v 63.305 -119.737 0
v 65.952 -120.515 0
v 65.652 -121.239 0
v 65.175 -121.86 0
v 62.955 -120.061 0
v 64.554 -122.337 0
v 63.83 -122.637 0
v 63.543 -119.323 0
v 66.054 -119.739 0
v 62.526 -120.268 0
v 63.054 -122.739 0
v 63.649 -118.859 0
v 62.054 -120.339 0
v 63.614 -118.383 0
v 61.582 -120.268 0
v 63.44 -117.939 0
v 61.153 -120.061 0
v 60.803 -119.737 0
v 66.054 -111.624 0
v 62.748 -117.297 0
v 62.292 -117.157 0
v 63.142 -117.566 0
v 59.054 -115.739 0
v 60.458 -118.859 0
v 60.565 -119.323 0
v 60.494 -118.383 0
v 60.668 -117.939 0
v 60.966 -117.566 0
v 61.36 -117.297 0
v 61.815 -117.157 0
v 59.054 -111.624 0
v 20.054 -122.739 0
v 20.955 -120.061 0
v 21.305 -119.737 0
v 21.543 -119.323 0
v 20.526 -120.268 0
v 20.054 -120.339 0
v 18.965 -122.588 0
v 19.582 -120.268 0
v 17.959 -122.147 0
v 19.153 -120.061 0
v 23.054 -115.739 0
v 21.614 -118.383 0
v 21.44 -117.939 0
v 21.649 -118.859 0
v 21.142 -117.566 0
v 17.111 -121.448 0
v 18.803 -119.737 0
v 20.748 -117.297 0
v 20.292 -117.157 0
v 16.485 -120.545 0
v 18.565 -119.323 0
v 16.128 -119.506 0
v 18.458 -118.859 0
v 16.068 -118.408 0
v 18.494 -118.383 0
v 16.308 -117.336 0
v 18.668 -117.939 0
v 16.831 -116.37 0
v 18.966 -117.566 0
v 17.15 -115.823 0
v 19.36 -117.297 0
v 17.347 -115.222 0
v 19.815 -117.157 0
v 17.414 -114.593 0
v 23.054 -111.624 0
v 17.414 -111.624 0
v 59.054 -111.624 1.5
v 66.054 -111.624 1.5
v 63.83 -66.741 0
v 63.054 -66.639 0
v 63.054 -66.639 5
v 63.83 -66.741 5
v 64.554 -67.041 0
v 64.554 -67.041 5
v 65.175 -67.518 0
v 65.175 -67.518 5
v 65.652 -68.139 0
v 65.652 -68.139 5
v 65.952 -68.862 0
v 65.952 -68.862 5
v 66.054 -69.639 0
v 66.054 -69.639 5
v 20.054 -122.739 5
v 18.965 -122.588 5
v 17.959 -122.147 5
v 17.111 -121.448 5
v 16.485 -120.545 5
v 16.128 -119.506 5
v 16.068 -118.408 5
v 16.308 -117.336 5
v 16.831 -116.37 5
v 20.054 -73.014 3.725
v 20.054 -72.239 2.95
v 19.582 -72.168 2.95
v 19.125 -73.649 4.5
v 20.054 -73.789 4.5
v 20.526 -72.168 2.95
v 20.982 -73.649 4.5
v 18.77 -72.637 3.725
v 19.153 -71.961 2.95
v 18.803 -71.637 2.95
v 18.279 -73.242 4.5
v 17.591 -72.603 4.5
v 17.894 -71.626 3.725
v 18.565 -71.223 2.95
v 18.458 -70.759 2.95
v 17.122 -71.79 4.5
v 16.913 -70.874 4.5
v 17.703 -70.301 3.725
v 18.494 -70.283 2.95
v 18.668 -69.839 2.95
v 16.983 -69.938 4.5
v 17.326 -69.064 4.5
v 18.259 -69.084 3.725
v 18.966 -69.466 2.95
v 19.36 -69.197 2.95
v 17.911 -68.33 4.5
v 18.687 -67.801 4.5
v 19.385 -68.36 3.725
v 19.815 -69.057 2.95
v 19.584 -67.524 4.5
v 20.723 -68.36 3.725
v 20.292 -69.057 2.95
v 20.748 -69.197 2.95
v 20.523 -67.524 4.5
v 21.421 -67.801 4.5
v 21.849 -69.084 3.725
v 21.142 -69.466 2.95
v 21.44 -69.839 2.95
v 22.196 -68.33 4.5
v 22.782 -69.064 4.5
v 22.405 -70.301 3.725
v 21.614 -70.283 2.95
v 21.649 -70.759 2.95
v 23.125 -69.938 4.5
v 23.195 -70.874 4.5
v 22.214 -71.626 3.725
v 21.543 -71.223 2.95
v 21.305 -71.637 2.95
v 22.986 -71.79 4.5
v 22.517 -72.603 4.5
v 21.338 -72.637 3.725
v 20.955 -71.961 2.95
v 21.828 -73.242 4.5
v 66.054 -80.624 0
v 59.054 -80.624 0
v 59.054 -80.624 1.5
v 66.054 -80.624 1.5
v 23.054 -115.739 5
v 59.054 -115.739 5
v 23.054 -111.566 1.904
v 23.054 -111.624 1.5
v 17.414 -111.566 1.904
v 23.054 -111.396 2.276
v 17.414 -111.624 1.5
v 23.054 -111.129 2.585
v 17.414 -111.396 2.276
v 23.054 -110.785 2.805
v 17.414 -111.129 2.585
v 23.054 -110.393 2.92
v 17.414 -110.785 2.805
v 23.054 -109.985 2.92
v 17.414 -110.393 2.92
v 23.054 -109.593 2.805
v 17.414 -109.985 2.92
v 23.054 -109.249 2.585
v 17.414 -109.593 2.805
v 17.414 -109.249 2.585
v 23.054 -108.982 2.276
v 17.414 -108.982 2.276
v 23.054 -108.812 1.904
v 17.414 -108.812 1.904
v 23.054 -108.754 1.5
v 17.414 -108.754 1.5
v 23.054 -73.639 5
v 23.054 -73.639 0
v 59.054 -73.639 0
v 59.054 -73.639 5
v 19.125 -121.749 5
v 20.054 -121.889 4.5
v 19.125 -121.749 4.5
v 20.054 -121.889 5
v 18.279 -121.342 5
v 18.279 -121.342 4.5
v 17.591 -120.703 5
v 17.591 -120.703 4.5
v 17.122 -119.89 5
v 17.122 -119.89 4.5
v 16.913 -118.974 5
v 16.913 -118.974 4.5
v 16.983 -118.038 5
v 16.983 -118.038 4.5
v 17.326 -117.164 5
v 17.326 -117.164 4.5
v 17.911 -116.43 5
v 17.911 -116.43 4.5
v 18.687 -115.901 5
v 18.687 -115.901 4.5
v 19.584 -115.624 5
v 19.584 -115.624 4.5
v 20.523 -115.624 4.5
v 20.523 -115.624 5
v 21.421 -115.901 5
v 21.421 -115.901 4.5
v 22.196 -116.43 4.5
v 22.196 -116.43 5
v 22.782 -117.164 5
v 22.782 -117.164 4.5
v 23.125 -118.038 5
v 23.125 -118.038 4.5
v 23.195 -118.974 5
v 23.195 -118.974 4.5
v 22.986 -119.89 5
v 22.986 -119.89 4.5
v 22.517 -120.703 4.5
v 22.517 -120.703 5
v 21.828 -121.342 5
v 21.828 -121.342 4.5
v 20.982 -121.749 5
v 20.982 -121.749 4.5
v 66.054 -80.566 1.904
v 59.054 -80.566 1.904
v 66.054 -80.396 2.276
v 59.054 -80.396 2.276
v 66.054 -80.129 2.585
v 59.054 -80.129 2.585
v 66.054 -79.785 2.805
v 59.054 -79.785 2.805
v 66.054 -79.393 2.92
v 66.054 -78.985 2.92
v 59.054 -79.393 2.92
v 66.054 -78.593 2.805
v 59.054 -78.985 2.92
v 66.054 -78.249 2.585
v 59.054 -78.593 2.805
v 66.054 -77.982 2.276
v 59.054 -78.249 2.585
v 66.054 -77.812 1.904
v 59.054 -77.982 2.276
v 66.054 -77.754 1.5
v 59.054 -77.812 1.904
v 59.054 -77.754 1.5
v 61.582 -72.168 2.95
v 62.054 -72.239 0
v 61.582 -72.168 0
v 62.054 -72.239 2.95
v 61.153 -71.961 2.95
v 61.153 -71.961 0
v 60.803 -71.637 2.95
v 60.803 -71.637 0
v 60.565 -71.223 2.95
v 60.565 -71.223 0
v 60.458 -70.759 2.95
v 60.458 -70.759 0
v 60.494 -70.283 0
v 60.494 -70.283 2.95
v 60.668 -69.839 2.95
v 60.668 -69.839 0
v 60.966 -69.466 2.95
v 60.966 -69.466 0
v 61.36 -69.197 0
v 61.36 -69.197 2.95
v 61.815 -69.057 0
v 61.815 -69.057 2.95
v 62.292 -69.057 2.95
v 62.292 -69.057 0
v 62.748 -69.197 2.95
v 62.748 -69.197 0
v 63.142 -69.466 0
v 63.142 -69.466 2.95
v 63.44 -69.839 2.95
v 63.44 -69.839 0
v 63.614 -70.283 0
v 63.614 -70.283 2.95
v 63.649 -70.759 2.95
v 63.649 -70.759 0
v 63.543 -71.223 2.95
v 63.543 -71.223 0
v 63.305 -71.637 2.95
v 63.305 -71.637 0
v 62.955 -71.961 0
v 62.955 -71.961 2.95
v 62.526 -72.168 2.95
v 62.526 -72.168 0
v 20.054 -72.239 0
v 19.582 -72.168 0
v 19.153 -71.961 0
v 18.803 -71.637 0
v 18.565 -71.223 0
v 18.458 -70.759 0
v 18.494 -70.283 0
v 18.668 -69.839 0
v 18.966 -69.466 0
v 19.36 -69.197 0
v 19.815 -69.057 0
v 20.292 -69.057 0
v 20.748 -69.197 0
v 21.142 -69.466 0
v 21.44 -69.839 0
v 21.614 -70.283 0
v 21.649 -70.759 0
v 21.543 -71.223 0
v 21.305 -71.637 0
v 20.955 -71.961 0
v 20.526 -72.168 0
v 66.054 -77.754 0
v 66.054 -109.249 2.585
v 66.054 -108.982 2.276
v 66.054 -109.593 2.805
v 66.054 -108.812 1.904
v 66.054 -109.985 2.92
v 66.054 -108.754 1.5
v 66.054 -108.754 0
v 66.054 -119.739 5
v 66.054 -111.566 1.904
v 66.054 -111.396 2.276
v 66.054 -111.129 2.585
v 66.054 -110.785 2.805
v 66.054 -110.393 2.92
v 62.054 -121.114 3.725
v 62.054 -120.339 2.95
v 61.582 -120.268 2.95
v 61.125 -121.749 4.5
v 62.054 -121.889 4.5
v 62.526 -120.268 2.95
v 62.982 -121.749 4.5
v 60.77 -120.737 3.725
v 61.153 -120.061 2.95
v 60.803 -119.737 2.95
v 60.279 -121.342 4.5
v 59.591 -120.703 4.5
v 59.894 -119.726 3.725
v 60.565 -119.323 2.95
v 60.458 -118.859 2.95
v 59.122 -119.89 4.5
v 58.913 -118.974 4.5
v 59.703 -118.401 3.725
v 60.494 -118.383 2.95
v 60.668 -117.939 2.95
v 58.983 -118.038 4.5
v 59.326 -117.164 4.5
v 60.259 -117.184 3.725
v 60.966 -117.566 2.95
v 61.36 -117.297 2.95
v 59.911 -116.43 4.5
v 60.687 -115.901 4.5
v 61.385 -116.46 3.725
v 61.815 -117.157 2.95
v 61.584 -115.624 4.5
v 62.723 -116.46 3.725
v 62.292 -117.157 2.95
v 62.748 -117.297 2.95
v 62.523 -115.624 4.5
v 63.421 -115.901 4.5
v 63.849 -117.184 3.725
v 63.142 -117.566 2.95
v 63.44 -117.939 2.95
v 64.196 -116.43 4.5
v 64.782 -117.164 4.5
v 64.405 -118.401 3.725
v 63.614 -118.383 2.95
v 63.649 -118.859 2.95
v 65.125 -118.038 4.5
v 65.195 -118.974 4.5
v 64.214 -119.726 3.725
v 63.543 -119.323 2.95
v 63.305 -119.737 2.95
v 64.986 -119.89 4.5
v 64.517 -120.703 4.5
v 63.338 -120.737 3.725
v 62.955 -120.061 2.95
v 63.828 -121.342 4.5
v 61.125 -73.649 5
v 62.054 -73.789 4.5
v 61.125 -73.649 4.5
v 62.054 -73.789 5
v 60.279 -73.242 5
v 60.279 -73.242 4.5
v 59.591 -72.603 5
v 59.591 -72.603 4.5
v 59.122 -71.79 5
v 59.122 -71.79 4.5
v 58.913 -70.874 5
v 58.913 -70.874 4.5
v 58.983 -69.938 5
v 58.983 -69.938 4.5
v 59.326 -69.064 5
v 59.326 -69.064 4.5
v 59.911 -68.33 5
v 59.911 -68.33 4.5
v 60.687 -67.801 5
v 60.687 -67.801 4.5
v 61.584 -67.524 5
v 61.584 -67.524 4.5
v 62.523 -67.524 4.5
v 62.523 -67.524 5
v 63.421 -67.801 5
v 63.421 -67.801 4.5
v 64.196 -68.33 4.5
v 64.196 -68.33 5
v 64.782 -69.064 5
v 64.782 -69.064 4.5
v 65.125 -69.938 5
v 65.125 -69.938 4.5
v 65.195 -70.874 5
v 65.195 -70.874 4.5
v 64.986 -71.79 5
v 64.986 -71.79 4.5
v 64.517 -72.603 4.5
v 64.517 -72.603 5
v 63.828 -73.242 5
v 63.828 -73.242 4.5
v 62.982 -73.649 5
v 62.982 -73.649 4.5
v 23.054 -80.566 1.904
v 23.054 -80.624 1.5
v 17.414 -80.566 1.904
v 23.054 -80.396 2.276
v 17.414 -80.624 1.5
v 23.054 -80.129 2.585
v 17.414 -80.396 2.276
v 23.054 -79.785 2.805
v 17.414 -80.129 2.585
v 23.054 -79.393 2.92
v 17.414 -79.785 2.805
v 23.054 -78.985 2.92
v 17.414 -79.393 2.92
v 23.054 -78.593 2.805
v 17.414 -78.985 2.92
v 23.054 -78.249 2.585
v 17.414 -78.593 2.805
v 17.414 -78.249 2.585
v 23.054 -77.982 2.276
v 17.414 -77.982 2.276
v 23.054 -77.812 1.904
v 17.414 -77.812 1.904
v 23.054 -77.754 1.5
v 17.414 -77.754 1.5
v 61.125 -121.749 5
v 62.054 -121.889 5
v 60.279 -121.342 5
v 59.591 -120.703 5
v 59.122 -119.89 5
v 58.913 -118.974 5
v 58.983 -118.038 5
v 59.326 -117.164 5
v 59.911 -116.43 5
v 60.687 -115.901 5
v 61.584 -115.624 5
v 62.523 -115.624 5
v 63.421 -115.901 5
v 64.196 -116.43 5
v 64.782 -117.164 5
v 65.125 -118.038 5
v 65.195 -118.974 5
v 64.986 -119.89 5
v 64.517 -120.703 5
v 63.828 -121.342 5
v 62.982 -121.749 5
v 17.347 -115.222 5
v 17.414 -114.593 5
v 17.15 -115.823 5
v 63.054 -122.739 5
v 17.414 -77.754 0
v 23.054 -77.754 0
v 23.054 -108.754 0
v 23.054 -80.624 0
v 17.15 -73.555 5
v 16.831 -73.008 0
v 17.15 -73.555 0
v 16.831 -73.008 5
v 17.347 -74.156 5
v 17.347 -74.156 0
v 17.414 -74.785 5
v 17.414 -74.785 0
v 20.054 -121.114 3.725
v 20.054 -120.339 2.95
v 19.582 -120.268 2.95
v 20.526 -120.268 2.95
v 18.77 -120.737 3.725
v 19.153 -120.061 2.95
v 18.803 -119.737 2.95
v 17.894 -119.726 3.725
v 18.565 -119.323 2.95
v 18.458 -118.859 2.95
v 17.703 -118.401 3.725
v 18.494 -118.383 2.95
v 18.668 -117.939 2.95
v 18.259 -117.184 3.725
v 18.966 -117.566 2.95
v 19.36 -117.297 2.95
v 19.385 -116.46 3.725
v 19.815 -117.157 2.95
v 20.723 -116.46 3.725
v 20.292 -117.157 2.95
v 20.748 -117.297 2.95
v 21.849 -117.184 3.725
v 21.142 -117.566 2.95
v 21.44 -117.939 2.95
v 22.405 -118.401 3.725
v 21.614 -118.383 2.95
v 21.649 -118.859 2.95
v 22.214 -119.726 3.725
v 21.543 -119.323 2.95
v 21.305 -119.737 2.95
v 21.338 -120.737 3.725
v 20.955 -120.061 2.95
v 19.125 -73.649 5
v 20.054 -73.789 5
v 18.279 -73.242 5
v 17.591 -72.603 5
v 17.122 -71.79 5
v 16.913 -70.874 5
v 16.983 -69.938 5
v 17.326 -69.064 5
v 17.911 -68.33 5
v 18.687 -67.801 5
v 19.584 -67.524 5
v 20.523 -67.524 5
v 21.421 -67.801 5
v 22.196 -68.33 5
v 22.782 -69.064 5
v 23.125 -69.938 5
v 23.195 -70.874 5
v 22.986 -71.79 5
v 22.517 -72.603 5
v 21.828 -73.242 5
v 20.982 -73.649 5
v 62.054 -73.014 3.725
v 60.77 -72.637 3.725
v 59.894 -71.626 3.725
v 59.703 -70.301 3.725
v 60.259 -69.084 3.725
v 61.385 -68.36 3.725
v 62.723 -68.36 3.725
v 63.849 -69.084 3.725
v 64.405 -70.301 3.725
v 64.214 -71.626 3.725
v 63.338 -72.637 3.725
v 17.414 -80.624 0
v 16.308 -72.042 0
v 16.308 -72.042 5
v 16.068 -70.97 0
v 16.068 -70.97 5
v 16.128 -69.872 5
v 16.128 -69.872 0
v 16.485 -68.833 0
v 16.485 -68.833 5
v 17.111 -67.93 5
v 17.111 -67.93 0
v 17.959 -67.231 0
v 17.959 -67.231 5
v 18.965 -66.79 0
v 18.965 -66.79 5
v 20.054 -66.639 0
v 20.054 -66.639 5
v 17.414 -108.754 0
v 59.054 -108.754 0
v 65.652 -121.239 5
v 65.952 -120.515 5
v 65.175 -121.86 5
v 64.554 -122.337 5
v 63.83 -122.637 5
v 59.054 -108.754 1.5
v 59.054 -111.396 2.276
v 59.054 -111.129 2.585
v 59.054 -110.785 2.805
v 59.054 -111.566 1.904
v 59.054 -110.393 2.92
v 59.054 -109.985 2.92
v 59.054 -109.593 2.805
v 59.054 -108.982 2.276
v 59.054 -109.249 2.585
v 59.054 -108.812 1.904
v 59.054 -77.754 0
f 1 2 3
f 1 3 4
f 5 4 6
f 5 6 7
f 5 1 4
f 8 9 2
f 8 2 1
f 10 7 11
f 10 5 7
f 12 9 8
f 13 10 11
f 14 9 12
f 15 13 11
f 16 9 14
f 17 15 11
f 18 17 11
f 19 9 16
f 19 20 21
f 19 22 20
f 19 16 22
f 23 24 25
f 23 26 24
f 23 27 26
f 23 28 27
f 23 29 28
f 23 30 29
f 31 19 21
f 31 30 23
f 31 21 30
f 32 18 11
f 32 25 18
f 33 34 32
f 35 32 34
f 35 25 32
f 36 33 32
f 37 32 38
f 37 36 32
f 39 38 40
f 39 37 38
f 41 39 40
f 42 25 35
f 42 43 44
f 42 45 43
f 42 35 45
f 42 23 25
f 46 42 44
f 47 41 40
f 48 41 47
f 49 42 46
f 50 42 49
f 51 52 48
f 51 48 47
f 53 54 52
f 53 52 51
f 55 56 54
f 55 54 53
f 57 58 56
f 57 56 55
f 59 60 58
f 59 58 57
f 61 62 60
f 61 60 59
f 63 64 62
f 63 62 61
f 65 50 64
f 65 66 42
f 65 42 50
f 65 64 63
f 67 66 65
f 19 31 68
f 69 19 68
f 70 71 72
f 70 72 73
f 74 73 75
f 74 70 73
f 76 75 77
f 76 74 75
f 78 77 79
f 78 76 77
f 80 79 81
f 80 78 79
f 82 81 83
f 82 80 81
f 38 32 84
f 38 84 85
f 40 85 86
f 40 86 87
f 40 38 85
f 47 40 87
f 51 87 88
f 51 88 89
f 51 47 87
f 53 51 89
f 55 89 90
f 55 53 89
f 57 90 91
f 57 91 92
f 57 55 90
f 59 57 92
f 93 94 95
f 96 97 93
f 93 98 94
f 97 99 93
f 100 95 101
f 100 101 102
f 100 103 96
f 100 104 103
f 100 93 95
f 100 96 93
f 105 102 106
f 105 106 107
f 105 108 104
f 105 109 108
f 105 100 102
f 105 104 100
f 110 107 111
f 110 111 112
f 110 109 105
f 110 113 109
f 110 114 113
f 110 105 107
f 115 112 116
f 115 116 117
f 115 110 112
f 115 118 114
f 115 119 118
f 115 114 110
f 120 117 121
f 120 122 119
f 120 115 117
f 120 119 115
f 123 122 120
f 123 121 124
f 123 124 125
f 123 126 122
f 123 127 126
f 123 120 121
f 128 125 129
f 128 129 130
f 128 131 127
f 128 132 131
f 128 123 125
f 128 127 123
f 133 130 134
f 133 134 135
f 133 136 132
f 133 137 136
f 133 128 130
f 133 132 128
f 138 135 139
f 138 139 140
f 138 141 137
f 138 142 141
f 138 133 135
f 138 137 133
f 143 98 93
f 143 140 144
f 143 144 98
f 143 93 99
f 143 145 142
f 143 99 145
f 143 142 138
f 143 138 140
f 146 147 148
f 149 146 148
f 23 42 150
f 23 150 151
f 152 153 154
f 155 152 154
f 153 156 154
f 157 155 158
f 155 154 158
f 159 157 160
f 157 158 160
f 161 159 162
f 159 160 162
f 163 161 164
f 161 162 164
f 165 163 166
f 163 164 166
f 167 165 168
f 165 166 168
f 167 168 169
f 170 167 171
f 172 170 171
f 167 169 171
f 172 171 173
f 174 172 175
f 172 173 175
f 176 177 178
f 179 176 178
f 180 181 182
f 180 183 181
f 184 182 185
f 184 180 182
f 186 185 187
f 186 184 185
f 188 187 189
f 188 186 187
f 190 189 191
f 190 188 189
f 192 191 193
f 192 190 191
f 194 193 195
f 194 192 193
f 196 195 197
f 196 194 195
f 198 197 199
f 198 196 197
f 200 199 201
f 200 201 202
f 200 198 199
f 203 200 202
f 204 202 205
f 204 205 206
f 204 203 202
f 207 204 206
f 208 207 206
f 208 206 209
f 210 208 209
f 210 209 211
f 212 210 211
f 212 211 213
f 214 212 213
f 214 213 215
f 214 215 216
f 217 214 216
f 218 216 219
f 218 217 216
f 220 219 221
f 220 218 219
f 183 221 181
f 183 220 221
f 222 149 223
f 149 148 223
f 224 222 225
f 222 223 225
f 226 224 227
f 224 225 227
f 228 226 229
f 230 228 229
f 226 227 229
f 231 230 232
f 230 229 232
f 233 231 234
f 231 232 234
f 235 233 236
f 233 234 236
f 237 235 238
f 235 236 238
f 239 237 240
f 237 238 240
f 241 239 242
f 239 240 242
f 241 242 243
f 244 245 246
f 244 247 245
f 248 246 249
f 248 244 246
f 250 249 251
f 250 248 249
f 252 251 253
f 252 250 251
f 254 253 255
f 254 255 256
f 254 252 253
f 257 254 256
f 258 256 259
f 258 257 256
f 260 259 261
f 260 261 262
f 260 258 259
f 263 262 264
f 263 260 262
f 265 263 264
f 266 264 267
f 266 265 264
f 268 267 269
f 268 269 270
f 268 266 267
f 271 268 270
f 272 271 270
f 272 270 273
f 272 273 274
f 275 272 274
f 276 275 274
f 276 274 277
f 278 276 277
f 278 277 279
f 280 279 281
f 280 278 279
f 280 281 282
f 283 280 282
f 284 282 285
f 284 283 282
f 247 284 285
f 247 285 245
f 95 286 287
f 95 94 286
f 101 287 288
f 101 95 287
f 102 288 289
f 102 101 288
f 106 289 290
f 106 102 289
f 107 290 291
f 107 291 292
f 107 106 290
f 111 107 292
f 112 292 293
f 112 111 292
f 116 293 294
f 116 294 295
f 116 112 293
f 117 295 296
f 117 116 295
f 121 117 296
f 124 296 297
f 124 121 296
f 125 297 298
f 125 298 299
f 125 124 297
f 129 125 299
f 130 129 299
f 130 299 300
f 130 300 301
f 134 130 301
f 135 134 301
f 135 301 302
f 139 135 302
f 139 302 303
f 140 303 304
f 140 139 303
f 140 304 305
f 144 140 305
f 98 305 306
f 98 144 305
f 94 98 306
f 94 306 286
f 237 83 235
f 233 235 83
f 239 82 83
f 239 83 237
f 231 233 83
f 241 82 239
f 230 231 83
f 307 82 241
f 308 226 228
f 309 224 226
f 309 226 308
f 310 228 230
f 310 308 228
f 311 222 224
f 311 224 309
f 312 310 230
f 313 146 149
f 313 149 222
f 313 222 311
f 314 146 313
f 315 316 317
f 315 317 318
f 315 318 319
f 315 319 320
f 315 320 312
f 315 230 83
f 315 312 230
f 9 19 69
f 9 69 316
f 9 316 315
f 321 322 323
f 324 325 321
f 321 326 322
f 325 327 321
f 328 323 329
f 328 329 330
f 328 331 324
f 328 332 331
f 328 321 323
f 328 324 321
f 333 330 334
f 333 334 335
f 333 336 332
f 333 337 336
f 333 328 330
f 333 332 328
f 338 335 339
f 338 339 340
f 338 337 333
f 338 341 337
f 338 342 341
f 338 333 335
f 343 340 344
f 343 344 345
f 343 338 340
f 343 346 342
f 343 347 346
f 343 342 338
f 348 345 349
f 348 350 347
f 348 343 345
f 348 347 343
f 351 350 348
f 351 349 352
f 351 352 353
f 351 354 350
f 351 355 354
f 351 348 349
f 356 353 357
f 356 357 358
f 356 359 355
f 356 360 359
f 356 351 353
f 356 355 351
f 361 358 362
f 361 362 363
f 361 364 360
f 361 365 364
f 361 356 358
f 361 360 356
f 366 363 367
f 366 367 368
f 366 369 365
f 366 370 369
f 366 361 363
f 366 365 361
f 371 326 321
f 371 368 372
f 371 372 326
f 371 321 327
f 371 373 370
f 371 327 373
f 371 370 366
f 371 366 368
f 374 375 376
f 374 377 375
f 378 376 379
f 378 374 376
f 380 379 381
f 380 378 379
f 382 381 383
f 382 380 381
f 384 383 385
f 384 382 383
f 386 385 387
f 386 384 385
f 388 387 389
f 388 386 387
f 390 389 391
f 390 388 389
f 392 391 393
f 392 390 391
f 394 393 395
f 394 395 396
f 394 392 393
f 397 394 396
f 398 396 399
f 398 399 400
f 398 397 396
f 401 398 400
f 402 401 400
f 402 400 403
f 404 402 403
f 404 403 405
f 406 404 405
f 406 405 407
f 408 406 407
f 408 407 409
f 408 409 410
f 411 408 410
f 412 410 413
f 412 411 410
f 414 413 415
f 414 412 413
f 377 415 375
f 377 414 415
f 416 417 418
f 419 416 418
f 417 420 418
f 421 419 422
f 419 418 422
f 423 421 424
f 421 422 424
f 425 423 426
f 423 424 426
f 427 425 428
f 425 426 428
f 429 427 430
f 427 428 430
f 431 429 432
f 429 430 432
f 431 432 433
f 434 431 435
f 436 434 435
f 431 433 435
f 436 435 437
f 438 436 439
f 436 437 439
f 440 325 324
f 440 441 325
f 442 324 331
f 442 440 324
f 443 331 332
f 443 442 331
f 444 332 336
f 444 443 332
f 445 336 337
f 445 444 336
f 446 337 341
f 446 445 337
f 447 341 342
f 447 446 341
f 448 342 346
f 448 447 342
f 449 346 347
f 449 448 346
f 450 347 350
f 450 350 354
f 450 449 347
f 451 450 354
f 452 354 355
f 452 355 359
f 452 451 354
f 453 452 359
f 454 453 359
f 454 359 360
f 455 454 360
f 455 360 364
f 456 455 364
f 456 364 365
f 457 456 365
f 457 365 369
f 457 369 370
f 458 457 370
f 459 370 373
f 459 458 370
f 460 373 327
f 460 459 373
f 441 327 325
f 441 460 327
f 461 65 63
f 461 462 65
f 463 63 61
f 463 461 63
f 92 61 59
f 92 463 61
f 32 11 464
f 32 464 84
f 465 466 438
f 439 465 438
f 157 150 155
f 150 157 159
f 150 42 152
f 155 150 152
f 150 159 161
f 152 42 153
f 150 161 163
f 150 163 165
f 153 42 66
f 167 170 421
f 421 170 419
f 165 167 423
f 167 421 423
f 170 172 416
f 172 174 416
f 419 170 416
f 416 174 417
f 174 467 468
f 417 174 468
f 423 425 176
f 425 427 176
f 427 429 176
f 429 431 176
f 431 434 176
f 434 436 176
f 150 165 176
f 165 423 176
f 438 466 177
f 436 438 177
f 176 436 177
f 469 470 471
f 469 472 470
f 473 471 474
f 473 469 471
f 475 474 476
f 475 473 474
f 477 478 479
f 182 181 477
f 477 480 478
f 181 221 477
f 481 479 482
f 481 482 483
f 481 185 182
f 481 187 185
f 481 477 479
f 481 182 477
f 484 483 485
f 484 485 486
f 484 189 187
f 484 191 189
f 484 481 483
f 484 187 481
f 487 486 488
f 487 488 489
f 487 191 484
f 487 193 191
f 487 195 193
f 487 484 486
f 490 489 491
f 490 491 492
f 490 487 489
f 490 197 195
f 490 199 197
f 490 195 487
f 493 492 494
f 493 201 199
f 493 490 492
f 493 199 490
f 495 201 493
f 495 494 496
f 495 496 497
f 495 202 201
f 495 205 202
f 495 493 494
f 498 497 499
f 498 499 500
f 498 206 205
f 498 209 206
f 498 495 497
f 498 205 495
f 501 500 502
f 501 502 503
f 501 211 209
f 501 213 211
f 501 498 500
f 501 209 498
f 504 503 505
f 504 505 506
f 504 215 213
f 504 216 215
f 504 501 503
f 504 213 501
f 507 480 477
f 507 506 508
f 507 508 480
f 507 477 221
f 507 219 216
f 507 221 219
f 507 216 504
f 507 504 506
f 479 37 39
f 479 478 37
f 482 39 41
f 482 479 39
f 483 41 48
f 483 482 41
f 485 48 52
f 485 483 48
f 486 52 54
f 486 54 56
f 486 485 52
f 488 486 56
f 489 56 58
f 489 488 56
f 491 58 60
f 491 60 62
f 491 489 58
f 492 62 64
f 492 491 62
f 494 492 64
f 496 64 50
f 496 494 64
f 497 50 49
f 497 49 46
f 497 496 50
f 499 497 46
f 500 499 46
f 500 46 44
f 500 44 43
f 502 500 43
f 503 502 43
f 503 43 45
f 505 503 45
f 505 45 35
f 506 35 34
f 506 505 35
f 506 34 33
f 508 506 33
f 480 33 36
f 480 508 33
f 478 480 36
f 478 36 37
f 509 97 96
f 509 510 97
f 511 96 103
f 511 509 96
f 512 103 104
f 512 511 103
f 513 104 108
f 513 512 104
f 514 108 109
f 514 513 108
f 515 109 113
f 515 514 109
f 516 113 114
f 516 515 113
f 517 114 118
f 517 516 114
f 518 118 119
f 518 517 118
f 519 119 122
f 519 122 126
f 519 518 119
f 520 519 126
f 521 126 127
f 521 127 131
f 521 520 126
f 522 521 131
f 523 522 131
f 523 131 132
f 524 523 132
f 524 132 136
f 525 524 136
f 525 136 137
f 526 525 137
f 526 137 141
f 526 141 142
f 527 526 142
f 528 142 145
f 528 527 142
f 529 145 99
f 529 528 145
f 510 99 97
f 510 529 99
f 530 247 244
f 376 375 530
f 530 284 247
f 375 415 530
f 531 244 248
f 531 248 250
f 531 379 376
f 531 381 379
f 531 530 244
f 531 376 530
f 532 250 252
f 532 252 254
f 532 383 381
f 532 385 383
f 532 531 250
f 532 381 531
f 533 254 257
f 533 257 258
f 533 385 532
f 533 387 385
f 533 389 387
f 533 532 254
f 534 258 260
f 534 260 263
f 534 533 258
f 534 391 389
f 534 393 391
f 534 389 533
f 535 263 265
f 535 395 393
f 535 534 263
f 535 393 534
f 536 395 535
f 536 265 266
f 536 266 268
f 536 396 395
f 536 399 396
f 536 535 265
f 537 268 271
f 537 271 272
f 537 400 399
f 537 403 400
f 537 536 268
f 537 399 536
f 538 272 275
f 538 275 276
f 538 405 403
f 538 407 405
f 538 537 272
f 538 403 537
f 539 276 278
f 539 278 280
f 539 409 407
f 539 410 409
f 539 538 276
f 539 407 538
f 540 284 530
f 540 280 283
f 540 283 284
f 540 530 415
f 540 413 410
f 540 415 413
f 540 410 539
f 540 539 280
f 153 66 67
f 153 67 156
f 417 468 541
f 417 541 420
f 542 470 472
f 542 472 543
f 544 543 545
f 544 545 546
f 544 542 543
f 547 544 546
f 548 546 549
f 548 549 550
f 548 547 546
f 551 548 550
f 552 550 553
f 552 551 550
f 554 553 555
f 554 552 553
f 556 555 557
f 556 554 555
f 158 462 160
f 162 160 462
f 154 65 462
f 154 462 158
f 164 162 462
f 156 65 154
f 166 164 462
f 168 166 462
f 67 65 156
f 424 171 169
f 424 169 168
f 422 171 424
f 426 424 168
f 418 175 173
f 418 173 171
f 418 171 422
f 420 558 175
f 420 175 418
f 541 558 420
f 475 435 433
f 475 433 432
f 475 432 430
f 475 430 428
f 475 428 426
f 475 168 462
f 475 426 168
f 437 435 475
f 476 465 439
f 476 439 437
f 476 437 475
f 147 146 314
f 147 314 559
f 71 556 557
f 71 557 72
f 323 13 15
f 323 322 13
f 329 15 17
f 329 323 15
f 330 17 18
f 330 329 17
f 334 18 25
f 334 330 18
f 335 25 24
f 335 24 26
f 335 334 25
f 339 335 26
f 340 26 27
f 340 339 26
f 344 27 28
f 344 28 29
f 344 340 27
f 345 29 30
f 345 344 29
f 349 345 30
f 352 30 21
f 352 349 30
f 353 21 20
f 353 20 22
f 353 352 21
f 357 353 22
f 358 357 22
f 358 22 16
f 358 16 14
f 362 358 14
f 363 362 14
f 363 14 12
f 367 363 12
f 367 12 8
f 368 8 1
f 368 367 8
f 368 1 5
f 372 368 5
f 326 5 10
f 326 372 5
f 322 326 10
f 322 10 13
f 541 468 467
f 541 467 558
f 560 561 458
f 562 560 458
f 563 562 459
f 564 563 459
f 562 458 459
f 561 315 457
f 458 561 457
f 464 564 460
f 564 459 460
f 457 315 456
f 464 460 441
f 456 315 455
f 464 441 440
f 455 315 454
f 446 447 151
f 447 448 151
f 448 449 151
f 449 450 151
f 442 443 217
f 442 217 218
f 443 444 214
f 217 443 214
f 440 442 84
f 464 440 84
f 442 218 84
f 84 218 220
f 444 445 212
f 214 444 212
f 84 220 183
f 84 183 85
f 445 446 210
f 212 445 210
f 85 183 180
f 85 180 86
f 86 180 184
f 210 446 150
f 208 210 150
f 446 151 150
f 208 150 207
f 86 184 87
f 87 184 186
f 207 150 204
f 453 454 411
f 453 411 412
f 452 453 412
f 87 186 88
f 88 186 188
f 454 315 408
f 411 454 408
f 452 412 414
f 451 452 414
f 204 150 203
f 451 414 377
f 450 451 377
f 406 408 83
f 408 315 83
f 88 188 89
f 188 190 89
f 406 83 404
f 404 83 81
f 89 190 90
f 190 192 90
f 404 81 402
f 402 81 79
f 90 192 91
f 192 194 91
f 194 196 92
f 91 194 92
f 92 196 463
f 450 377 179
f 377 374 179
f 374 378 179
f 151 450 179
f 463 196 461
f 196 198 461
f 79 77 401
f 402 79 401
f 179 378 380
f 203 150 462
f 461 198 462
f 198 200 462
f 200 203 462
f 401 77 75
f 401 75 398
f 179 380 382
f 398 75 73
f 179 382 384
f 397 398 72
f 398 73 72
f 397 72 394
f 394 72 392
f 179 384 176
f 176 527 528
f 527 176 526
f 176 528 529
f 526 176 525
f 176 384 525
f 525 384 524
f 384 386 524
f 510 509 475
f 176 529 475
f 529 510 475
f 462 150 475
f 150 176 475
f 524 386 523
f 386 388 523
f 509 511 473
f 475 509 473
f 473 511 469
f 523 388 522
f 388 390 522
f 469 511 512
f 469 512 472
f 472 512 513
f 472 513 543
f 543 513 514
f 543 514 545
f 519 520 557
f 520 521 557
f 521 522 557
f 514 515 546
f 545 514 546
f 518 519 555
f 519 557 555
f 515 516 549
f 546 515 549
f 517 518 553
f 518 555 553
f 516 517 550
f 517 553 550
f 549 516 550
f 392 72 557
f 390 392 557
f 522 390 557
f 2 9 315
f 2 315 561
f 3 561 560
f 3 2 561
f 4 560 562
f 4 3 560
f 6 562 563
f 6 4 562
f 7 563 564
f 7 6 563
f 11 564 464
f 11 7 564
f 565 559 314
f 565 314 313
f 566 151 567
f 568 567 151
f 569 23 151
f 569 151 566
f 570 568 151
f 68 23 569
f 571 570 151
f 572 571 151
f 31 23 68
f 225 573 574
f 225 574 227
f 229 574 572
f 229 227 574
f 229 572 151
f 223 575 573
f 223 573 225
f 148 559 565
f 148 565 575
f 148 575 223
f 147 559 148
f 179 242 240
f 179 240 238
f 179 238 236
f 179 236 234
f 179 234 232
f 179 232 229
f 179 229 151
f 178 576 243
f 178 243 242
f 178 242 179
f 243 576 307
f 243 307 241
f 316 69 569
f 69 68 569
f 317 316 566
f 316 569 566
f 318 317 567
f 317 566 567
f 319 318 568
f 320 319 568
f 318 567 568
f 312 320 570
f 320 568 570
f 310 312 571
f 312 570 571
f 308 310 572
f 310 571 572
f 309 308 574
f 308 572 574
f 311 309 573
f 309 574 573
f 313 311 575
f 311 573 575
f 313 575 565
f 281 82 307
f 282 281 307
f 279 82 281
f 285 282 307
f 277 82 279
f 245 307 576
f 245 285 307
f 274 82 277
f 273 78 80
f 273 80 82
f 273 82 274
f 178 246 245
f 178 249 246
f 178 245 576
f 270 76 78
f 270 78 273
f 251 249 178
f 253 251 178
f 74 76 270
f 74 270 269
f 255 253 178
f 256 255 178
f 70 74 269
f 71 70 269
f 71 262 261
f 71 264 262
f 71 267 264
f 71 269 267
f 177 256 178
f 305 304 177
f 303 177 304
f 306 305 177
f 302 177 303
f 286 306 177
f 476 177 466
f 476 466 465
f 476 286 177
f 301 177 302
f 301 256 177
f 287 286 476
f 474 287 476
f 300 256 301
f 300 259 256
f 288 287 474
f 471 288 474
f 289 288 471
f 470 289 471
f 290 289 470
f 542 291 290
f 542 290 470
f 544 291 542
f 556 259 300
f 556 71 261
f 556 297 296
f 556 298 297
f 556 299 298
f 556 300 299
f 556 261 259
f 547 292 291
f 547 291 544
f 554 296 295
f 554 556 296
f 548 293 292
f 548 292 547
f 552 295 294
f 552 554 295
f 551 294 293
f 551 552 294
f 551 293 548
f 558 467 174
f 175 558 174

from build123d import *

# Parameters (mm, degrees)
SKETCH1_R                                    = 1.25
SKETCH1_W                                    = 36
SKETCH1_H                                    = 42.1
BOSS_EXTRUDE1_DEPTH                          = 5
CSK_FOR_M3_COUNTERSUNK_FLAT_HEAD_SCR_2_COUNT = 2
CSK_FOR_M3_COUNTERSUNK_FLAT_HEAD_SCR_2_PITCH = 48.1
CSK_FOR_M3_COUNTERSUNK_FLAT_HEAD_SCR_3_COUNT = 2
CSK_FOR_M3_COUNTERSUNK_FLAT_HEAD_SCR_3_PITCH = 63.856166499
CSK_FOR_M3_COUNTERSUNK_FLAT_HEAD_SCR_4_COUNT = 2
CSK_FOR_M3_COUNTERSUNK_FLAT_HEAD_SCR_4_PITCH = 42
FURO_COM_FOLGA_DE_M34_D                      = 2.87
FILETE1_R                                    = 3
ESBO_O3_W                                    = 1.5
ESBO_O3_H                                    = 2.87
CORTE_EXTRUS_O1_DEPTH                        = 63
CORTE_EXTRUS_O1_DEPTH_BACK                   = 10


with BuildPart() as part:
    # Sketch1 → Boss-Extrude1 (new body)
    with BuildSketch(Plane.XY):
        with BuildLine():
            Line((20.053938932, -66.638943184), (63.053938932, -66.638943184))
            ThreePointArc((63.053938932, -66.638943184), (65.175259276, -67.517622841), (66.053938932, -69.638943184))
            Line((66.053938932, -69.638943184), (66.053938932, -119.738943184))
            ThreePointArc((66.053938932, -119.738943184), (65.175259276, -121.860263528), (63.053938932, -122.738943184))
            Line((63.053938932, -122.738943184), (20.053938932, -122.738943184))
            ThreePointArc((20.053938932, -122.738943184), (16.310928808, -120.149572552), (17.413938931, -115.73388079))
            Line((17.413938931, -115.73388079), (17.413938931, -73.644005579))
            ThreePointArc((17.413938931, -73.644005579), (16.310928808, -69.228313817), (20.053938932, -66.638943184))
        make_face()
        with Locations((20.053938932, -70.638943184)):
            Circle(SKETCH1_R, mode=Mode.SUBTRACT)
        with Locations((20.053938932, -118.738943184)):
            Circle(SKETCH1_R, mode=Mode.SUBTRACT)
        with Locations((62.053938932, -70.638943184)):
            Circle(SKETCH1_R, mode=Mode.SUBTRACT)
        with Locations((62.053938932, -118.738943184)):
            Circle(SKETCH1_R, mode=Mode.SUBTRACT)
        with Locations((41.053938932, -94.688943184)):
            Rectangle(SKETCH1_W, SKETCH1_H, mode=Mode.SUBTRACT)
    extrude(amount=BOSS_EXTRUDE1_DEPTH)

    # Sketch2 → CSK for M3 Countersunk Flat Head Screw1 (revolve, cut)
    with BuildSketch(Plane(origin=(20.053938932, -118.738943184, 5), x_dir=(0, -1, 0), z_dir=(1, 0, 0))):
        Polygon((0, 0), (0, 5), (1.6, 5), (1.6, 2.05), (3.15, 0.5), (3.15, 0), align=None)
    csk_for_m3_countersunk_flat_head_screw1 = revolve(axis=Axis((20.053938932, -118.738943184, 11.35), (0, 0, -1)), mode=Mode.SUBTRACT)

    # CSK for M3 Countersunk Flat Head Scr 2: CSK for M3 Countersunk Flat Head Screw1 ×2
    with Locations(*[(0, i * CSK_FOR_M3_COUNTERSUNK_FLAT_HEAD_SCR_2_PITCH, 0) for i in range(1, CSK_FOR_M3_COUNTERSUNK_FLAT_HEAD_SCR_2_COUNT)]):
        add(csk_for_m3_countersunk_flat_head_screw1, mode=Mode.SUBTRACT)

    # CSK for M3 Countersunk Flat Head Scr 3: CSK for M3 Countersunk Flat Head Screw1 ×2
    with Locations(*[Vector(0.657728177, 0.753255365, 0) * (i * CSK_FOR_M3_COUNTERSUNK_FLAT_HEAD_SCR_3_PITCH) for i in range(1, CSK_FOR_M3_COUNTERSUNK_FLAT_HEAD_SCR_3_COUNT)]):
        add(csk_for_m3_countersunk_flat_head_screw1, mode=Mode.SUBTRACT)

    # CSK for M3 Countersunk Flat Head Scr 4: CSK for M3 Countersunk Flat Head Screw1 ×2
    with Locations(*[(i * CSK_FOR_M3_COUNTERSUNK_FLAT_HEAD_SCR_4_PITCH, 0, 0) for i in range(1, CSK_FOR_M3_COUNTERSUNK_FLAT_HEAD_SCR_4_COUNT)]):
        add(csk_for_m3_countersunk_flat_head_screw1, mode=Mode.SUBTRACT)

    # Furo com folga de M34 (through all)
    with Locations(Plane(origin=(66.053938932, 0, 0), x_dir=(0, 0, -1), z_dir=(1, 0, 0))):
        with Locations((-1.5, -79.188943184), (-1.5, -110.188943184)):
            Hole(FURO_COM_FOLGA_DE_M34_D / 2)

    # Filete1
    filete1_edges = [part.edges().sort_by_distance(p)[0] for p in [
        (17.413938931, -115.73388079, 2.5),
        (17.413938931, -73.644005579, 2.5),
    ]]
    fillet(filete1_edges, radius=FILETE1_R)

    # Esboço3 → Corte-extrusão1 (cut, two sides)
    with BuildSketch(Plane.ZY.offset(-59.053938932)) as corte_extrus_o1_sk:
        with Locations((0.75, -79.188943184)):
            Rectangle(ESBO_O3_W, ESBO_O3_H)
        with Locations((0.75, -110.188943184)):
            Rectangle(ESBO_O3_W, ESBO_O3_H)
    extrude(amount=CORTE_EXTRUS_O1_DEPTH, mode=Mode.SUBTRACT)
    extrude(corte_extrus_o1_sk.sketch, amount=-CORTE_EXTRUS_O1_DEPTH_BACK, mode=Mode.SUBTRACT)


solid = part.part
